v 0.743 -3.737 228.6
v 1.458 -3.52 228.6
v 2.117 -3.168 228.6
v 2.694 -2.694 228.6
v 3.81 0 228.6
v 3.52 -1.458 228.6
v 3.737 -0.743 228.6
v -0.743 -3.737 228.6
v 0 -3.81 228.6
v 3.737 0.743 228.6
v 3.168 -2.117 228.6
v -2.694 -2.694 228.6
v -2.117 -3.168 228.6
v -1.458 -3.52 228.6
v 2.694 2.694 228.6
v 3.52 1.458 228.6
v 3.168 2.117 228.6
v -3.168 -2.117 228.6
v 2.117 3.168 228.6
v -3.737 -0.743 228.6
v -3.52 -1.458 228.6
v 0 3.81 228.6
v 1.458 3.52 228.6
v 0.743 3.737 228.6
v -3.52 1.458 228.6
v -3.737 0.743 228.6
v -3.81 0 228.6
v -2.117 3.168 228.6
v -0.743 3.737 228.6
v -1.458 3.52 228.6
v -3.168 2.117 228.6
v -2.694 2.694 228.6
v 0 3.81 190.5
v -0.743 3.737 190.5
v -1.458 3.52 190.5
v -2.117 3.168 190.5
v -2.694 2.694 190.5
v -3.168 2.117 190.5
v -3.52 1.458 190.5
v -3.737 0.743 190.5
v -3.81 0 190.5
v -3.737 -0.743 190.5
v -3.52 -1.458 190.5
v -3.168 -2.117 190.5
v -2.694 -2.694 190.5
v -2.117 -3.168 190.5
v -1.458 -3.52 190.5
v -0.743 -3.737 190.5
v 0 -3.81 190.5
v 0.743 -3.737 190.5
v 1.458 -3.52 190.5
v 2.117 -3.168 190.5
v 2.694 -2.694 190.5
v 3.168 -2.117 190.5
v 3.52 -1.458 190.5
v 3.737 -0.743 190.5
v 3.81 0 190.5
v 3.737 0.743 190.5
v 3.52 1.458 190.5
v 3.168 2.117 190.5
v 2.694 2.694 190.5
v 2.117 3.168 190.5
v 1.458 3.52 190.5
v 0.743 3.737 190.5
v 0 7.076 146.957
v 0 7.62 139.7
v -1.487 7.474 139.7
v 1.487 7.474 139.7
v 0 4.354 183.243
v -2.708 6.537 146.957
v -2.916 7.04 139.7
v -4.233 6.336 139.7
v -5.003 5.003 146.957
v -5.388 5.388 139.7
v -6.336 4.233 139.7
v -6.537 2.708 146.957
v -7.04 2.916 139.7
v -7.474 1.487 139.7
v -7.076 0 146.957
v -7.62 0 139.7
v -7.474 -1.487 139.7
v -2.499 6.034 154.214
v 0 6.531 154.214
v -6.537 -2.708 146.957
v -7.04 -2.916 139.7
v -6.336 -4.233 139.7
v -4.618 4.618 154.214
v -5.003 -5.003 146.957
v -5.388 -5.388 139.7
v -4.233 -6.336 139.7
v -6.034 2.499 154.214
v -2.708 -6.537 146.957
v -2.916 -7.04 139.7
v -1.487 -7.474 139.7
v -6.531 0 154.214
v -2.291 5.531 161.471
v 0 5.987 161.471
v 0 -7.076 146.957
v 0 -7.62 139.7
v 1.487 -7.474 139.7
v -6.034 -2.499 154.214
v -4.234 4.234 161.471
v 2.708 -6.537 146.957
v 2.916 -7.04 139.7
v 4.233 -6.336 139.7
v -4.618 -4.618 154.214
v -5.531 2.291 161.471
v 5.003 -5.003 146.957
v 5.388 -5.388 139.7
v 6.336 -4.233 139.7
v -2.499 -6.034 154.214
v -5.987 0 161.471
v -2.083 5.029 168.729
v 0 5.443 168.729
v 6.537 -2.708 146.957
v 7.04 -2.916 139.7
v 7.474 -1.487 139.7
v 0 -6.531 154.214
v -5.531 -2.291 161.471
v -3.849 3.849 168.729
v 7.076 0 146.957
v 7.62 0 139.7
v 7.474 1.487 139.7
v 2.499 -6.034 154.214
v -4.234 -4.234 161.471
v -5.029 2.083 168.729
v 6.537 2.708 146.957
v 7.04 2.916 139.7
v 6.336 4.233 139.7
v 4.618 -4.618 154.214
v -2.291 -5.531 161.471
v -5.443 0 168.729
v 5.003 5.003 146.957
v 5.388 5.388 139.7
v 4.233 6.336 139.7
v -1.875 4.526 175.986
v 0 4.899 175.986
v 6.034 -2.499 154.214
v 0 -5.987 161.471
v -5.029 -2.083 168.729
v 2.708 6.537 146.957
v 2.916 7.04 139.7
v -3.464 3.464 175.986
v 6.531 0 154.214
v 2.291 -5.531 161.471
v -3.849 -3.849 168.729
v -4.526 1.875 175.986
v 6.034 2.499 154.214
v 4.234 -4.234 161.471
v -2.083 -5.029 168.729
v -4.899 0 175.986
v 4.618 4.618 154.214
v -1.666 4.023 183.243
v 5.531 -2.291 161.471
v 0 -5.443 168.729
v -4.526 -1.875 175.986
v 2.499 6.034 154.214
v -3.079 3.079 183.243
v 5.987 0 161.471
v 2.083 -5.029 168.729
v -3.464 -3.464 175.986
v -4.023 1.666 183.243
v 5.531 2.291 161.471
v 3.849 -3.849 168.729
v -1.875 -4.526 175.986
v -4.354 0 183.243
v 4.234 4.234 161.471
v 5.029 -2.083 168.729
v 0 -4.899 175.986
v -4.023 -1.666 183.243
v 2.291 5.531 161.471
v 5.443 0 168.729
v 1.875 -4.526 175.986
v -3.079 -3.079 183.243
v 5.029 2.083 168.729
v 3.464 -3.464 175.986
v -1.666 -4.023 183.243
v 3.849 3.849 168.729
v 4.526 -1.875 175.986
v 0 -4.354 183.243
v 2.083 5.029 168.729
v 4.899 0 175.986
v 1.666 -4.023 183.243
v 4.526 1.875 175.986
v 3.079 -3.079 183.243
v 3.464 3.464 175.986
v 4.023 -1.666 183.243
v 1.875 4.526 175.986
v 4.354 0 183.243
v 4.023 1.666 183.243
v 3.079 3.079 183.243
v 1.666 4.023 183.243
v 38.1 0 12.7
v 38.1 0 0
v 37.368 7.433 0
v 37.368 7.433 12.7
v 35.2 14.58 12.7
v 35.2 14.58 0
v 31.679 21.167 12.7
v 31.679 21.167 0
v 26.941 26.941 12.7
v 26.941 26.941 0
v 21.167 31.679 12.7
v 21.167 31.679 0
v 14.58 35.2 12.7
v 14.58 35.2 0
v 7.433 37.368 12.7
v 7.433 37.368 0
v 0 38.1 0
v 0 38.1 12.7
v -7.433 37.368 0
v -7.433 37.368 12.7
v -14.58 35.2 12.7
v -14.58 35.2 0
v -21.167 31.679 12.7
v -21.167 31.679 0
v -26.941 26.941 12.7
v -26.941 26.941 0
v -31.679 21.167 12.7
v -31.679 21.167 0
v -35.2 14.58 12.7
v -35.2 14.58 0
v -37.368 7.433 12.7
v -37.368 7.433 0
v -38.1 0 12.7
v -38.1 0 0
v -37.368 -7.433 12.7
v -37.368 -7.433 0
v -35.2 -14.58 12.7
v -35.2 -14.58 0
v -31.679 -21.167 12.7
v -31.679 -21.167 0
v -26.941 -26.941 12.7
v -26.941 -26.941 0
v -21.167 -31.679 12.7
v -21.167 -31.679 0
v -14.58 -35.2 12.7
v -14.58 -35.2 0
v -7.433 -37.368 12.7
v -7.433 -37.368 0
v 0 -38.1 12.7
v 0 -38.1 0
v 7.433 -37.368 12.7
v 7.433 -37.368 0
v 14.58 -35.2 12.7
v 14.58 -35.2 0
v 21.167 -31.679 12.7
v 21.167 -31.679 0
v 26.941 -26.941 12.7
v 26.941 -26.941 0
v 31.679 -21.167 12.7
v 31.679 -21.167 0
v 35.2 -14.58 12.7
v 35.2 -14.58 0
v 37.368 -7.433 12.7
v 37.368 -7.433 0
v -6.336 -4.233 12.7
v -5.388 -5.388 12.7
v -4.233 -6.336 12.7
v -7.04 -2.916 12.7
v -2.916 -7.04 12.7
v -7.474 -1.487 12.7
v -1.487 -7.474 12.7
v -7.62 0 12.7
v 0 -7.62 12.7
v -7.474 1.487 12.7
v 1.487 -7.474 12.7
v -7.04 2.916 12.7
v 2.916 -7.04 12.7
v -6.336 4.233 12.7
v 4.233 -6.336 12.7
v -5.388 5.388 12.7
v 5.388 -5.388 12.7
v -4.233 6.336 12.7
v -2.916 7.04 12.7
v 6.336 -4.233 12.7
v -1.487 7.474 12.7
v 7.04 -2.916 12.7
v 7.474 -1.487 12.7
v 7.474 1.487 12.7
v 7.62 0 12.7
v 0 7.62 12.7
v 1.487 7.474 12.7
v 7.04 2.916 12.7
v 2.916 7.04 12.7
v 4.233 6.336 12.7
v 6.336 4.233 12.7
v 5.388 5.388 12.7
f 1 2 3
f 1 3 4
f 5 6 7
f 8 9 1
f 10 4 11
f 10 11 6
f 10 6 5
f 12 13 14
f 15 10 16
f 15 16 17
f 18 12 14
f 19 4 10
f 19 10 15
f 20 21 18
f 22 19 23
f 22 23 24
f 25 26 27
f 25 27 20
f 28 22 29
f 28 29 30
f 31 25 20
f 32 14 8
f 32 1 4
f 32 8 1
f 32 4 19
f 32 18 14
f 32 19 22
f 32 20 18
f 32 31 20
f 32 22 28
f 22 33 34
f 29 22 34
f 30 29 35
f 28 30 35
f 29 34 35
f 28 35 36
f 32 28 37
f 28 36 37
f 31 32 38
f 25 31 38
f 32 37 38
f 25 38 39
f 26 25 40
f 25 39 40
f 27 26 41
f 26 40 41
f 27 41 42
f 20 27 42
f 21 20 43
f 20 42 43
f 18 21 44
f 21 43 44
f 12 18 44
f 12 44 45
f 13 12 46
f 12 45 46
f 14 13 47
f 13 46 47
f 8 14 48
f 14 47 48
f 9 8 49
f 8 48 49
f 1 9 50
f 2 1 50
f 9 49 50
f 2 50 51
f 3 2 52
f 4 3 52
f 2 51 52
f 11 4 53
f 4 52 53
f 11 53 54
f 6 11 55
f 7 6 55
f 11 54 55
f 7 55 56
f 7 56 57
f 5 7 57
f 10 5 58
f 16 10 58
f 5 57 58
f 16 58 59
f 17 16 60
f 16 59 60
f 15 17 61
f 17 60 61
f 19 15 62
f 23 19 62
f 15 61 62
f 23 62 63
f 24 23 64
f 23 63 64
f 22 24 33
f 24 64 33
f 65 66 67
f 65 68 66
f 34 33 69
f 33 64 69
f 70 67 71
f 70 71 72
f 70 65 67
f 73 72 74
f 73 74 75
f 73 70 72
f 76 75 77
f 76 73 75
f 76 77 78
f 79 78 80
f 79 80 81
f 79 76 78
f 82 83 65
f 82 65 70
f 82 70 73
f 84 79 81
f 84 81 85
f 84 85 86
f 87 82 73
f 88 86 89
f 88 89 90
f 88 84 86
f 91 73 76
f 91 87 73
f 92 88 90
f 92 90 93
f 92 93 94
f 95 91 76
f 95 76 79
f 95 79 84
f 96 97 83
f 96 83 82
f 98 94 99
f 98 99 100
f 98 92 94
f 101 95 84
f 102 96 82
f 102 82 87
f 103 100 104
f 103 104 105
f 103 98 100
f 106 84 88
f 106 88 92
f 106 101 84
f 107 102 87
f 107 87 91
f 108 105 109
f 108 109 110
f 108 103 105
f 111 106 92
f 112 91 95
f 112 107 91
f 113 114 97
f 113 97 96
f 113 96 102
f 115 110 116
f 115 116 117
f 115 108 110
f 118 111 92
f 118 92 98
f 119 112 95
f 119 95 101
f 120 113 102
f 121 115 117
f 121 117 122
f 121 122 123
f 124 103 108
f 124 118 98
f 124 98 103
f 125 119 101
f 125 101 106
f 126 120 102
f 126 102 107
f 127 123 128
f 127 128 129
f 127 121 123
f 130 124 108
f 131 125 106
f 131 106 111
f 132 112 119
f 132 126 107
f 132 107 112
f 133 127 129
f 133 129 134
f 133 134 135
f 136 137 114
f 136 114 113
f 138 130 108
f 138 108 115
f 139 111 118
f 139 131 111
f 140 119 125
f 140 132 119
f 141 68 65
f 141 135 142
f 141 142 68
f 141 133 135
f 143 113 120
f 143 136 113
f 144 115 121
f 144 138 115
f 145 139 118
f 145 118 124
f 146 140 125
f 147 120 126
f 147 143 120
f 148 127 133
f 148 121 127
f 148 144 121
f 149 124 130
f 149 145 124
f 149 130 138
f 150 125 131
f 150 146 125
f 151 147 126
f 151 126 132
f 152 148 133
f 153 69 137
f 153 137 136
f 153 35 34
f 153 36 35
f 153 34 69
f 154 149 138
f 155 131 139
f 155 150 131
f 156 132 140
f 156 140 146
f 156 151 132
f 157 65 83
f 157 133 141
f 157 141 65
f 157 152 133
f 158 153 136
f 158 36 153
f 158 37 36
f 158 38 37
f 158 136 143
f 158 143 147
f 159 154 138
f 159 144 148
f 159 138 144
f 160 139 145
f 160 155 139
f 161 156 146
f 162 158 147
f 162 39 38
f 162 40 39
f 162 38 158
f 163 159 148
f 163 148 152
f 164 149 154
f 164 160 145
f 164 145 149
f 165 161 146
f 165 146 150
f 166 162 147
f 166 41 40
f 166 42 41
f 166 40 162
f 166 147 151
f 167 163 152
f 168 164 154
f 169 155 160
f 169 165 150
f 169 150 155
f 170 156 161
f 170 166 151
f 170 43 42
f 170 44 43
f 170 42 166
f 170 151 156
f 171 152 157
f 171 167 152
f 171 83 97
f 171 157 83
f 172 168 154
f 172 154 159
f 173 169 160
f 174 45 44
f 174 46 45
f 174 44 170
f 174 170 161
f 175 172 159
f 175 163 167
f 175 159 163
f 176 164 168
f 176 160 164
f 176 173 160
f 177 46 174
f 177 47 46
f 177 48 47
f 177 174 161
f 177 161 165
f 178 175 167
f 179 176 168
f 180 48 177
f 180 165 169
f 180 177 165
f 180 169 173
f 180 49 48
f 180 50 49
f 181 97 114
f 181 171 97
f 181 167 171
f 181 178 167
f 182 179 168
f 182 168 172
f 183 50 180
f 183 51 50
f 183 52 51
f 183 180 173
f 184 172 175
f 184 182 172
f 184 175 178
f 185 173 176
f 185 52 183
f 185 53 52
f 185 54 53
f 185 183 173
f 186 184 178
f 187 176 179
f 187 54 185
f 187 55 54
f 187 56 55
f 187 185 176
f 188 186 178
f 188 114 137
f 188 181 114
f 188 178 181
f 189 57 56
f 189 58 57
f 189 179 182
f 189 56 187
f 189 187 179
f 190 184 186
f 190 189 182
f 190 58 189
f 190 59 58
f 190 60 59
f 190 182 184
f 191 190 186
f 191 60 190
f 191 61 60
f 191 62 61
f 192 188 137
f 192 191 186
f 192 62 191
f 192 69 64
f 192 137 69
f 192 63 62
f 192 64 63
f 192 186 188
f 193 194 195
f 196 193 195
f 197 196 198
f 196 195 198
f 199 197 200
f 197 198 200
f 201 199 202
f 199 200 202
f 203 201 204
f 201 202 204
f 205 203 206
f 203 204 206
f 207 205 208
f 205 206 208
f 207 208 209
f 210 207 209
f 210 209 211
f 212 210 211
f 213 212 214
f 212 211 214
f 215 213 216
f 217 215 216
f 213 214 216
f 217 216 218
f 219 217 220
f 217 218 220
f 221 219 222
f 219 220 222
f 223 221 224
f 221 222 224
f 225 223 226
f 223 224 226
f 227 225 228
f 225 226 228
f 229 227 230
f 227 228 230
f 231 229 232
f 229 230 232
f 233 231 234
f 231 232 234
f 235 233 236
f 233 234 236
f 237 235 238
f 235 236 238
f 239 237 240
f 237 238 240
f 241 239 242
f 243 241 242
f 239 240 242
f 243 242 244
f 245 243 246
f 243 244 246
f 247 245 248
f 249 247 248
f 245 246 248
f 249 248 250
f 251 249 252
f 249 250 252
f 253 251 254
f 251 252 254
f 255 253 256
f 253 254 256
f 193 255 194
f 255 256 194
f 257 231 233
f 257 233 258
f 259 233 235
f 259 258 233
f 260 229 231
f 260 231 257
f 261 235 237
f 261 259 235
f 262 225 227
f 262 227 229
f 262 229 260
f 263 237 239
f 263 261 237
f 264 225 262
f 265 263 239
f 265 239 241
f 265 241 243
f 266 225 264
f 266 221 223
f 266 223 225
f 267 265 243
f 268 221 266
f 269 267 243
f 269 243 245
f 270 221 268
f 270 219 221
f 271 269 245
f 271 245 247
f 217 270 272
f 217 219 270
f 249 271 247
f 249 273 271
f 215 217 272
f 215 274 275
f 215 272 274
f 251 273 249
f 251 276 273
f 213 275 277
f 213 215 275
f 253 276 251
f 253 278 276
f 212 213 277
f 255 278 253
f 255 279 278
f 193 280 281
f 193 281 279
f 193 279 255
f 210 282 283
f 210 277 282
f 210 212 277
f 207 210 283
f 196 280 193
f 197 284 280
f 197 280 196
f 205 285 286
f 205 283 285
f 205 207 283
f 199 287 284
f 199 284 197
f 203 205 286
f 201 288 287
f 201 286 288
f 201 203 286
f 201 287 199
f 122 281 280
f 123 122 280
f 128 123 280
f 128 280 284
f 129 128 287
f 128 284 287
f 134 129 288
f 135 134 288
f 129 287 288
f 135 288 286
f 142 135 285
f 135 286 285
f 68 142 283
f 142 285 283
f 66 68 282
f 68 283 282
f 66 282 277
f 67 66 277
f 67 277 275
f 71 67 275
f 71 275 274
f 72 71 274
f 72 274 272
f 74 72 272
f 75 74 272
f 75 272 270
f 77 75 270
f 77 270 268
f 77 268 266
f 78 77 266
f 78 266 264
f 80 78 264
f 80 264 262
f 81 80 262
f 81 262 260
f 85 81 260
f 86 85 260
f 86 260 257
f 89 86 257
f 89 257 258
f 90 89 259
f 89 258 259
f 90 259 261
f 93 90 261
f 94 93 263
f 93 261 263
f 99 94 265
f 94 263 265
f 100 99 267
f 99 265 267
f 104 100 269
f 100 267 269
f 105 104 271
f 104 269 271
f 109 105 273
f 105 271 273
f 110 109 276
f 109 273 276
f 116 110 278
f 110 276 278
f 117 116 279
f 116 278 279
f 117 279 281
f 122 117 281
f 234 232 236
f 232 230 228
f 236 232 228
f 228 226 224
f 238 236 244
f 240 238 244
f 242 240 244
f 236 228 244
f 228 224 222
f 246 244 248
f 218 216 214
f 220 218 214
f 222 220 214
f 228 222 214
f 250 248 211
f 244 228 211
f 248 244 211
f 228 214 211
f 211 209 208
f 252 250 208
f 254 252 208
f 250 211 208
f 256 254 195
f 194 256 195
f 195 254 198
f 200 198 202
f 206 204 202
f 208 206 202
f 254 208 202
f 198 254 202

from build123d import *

# Parameters (mm, degrees)
F0_R     = 38.1
F1_DEPTH = 12.7
F2_R     = 7.62
F3_DEPTH = 127
F6_DEPTH = 38.1


# Not quite as in the source:
# - a feature names something its author has since deleted; it is built from what else it names


with BuildPart() as f1:
    # F0 (on Top) → F1 (new body)
    with BuildSketch(Plane.XY):
        Circle(F0_R)
    extrude(amount=F1_DEPTH)

    # F2 (on face) → F3 (join)
    with BuildSketch(Plane.XY.offset(12.7)):
        Circle(F2_R)
    extrude(amount=F3_DEPTH)

    # F4 (on Right) → F5 (revolve)
    with BuildSketch(Plane.YZ):
        Polygon((0, 190.5), (0, 139.7), (7.62, 139.7), (3.81, 190.5), align=None)
    revolve(axis=Axis((0, 0, 165.1), (0, 0, 1)))

    # F6 (add): a face of the model
    f6_faces = [f1.faces().sort_by_distance(p)[0] for p in [
        (0, 0, 190.5),
    ]]
    extrude(f6_faces, amount=F6_DEPTH)


solid = f1.part
